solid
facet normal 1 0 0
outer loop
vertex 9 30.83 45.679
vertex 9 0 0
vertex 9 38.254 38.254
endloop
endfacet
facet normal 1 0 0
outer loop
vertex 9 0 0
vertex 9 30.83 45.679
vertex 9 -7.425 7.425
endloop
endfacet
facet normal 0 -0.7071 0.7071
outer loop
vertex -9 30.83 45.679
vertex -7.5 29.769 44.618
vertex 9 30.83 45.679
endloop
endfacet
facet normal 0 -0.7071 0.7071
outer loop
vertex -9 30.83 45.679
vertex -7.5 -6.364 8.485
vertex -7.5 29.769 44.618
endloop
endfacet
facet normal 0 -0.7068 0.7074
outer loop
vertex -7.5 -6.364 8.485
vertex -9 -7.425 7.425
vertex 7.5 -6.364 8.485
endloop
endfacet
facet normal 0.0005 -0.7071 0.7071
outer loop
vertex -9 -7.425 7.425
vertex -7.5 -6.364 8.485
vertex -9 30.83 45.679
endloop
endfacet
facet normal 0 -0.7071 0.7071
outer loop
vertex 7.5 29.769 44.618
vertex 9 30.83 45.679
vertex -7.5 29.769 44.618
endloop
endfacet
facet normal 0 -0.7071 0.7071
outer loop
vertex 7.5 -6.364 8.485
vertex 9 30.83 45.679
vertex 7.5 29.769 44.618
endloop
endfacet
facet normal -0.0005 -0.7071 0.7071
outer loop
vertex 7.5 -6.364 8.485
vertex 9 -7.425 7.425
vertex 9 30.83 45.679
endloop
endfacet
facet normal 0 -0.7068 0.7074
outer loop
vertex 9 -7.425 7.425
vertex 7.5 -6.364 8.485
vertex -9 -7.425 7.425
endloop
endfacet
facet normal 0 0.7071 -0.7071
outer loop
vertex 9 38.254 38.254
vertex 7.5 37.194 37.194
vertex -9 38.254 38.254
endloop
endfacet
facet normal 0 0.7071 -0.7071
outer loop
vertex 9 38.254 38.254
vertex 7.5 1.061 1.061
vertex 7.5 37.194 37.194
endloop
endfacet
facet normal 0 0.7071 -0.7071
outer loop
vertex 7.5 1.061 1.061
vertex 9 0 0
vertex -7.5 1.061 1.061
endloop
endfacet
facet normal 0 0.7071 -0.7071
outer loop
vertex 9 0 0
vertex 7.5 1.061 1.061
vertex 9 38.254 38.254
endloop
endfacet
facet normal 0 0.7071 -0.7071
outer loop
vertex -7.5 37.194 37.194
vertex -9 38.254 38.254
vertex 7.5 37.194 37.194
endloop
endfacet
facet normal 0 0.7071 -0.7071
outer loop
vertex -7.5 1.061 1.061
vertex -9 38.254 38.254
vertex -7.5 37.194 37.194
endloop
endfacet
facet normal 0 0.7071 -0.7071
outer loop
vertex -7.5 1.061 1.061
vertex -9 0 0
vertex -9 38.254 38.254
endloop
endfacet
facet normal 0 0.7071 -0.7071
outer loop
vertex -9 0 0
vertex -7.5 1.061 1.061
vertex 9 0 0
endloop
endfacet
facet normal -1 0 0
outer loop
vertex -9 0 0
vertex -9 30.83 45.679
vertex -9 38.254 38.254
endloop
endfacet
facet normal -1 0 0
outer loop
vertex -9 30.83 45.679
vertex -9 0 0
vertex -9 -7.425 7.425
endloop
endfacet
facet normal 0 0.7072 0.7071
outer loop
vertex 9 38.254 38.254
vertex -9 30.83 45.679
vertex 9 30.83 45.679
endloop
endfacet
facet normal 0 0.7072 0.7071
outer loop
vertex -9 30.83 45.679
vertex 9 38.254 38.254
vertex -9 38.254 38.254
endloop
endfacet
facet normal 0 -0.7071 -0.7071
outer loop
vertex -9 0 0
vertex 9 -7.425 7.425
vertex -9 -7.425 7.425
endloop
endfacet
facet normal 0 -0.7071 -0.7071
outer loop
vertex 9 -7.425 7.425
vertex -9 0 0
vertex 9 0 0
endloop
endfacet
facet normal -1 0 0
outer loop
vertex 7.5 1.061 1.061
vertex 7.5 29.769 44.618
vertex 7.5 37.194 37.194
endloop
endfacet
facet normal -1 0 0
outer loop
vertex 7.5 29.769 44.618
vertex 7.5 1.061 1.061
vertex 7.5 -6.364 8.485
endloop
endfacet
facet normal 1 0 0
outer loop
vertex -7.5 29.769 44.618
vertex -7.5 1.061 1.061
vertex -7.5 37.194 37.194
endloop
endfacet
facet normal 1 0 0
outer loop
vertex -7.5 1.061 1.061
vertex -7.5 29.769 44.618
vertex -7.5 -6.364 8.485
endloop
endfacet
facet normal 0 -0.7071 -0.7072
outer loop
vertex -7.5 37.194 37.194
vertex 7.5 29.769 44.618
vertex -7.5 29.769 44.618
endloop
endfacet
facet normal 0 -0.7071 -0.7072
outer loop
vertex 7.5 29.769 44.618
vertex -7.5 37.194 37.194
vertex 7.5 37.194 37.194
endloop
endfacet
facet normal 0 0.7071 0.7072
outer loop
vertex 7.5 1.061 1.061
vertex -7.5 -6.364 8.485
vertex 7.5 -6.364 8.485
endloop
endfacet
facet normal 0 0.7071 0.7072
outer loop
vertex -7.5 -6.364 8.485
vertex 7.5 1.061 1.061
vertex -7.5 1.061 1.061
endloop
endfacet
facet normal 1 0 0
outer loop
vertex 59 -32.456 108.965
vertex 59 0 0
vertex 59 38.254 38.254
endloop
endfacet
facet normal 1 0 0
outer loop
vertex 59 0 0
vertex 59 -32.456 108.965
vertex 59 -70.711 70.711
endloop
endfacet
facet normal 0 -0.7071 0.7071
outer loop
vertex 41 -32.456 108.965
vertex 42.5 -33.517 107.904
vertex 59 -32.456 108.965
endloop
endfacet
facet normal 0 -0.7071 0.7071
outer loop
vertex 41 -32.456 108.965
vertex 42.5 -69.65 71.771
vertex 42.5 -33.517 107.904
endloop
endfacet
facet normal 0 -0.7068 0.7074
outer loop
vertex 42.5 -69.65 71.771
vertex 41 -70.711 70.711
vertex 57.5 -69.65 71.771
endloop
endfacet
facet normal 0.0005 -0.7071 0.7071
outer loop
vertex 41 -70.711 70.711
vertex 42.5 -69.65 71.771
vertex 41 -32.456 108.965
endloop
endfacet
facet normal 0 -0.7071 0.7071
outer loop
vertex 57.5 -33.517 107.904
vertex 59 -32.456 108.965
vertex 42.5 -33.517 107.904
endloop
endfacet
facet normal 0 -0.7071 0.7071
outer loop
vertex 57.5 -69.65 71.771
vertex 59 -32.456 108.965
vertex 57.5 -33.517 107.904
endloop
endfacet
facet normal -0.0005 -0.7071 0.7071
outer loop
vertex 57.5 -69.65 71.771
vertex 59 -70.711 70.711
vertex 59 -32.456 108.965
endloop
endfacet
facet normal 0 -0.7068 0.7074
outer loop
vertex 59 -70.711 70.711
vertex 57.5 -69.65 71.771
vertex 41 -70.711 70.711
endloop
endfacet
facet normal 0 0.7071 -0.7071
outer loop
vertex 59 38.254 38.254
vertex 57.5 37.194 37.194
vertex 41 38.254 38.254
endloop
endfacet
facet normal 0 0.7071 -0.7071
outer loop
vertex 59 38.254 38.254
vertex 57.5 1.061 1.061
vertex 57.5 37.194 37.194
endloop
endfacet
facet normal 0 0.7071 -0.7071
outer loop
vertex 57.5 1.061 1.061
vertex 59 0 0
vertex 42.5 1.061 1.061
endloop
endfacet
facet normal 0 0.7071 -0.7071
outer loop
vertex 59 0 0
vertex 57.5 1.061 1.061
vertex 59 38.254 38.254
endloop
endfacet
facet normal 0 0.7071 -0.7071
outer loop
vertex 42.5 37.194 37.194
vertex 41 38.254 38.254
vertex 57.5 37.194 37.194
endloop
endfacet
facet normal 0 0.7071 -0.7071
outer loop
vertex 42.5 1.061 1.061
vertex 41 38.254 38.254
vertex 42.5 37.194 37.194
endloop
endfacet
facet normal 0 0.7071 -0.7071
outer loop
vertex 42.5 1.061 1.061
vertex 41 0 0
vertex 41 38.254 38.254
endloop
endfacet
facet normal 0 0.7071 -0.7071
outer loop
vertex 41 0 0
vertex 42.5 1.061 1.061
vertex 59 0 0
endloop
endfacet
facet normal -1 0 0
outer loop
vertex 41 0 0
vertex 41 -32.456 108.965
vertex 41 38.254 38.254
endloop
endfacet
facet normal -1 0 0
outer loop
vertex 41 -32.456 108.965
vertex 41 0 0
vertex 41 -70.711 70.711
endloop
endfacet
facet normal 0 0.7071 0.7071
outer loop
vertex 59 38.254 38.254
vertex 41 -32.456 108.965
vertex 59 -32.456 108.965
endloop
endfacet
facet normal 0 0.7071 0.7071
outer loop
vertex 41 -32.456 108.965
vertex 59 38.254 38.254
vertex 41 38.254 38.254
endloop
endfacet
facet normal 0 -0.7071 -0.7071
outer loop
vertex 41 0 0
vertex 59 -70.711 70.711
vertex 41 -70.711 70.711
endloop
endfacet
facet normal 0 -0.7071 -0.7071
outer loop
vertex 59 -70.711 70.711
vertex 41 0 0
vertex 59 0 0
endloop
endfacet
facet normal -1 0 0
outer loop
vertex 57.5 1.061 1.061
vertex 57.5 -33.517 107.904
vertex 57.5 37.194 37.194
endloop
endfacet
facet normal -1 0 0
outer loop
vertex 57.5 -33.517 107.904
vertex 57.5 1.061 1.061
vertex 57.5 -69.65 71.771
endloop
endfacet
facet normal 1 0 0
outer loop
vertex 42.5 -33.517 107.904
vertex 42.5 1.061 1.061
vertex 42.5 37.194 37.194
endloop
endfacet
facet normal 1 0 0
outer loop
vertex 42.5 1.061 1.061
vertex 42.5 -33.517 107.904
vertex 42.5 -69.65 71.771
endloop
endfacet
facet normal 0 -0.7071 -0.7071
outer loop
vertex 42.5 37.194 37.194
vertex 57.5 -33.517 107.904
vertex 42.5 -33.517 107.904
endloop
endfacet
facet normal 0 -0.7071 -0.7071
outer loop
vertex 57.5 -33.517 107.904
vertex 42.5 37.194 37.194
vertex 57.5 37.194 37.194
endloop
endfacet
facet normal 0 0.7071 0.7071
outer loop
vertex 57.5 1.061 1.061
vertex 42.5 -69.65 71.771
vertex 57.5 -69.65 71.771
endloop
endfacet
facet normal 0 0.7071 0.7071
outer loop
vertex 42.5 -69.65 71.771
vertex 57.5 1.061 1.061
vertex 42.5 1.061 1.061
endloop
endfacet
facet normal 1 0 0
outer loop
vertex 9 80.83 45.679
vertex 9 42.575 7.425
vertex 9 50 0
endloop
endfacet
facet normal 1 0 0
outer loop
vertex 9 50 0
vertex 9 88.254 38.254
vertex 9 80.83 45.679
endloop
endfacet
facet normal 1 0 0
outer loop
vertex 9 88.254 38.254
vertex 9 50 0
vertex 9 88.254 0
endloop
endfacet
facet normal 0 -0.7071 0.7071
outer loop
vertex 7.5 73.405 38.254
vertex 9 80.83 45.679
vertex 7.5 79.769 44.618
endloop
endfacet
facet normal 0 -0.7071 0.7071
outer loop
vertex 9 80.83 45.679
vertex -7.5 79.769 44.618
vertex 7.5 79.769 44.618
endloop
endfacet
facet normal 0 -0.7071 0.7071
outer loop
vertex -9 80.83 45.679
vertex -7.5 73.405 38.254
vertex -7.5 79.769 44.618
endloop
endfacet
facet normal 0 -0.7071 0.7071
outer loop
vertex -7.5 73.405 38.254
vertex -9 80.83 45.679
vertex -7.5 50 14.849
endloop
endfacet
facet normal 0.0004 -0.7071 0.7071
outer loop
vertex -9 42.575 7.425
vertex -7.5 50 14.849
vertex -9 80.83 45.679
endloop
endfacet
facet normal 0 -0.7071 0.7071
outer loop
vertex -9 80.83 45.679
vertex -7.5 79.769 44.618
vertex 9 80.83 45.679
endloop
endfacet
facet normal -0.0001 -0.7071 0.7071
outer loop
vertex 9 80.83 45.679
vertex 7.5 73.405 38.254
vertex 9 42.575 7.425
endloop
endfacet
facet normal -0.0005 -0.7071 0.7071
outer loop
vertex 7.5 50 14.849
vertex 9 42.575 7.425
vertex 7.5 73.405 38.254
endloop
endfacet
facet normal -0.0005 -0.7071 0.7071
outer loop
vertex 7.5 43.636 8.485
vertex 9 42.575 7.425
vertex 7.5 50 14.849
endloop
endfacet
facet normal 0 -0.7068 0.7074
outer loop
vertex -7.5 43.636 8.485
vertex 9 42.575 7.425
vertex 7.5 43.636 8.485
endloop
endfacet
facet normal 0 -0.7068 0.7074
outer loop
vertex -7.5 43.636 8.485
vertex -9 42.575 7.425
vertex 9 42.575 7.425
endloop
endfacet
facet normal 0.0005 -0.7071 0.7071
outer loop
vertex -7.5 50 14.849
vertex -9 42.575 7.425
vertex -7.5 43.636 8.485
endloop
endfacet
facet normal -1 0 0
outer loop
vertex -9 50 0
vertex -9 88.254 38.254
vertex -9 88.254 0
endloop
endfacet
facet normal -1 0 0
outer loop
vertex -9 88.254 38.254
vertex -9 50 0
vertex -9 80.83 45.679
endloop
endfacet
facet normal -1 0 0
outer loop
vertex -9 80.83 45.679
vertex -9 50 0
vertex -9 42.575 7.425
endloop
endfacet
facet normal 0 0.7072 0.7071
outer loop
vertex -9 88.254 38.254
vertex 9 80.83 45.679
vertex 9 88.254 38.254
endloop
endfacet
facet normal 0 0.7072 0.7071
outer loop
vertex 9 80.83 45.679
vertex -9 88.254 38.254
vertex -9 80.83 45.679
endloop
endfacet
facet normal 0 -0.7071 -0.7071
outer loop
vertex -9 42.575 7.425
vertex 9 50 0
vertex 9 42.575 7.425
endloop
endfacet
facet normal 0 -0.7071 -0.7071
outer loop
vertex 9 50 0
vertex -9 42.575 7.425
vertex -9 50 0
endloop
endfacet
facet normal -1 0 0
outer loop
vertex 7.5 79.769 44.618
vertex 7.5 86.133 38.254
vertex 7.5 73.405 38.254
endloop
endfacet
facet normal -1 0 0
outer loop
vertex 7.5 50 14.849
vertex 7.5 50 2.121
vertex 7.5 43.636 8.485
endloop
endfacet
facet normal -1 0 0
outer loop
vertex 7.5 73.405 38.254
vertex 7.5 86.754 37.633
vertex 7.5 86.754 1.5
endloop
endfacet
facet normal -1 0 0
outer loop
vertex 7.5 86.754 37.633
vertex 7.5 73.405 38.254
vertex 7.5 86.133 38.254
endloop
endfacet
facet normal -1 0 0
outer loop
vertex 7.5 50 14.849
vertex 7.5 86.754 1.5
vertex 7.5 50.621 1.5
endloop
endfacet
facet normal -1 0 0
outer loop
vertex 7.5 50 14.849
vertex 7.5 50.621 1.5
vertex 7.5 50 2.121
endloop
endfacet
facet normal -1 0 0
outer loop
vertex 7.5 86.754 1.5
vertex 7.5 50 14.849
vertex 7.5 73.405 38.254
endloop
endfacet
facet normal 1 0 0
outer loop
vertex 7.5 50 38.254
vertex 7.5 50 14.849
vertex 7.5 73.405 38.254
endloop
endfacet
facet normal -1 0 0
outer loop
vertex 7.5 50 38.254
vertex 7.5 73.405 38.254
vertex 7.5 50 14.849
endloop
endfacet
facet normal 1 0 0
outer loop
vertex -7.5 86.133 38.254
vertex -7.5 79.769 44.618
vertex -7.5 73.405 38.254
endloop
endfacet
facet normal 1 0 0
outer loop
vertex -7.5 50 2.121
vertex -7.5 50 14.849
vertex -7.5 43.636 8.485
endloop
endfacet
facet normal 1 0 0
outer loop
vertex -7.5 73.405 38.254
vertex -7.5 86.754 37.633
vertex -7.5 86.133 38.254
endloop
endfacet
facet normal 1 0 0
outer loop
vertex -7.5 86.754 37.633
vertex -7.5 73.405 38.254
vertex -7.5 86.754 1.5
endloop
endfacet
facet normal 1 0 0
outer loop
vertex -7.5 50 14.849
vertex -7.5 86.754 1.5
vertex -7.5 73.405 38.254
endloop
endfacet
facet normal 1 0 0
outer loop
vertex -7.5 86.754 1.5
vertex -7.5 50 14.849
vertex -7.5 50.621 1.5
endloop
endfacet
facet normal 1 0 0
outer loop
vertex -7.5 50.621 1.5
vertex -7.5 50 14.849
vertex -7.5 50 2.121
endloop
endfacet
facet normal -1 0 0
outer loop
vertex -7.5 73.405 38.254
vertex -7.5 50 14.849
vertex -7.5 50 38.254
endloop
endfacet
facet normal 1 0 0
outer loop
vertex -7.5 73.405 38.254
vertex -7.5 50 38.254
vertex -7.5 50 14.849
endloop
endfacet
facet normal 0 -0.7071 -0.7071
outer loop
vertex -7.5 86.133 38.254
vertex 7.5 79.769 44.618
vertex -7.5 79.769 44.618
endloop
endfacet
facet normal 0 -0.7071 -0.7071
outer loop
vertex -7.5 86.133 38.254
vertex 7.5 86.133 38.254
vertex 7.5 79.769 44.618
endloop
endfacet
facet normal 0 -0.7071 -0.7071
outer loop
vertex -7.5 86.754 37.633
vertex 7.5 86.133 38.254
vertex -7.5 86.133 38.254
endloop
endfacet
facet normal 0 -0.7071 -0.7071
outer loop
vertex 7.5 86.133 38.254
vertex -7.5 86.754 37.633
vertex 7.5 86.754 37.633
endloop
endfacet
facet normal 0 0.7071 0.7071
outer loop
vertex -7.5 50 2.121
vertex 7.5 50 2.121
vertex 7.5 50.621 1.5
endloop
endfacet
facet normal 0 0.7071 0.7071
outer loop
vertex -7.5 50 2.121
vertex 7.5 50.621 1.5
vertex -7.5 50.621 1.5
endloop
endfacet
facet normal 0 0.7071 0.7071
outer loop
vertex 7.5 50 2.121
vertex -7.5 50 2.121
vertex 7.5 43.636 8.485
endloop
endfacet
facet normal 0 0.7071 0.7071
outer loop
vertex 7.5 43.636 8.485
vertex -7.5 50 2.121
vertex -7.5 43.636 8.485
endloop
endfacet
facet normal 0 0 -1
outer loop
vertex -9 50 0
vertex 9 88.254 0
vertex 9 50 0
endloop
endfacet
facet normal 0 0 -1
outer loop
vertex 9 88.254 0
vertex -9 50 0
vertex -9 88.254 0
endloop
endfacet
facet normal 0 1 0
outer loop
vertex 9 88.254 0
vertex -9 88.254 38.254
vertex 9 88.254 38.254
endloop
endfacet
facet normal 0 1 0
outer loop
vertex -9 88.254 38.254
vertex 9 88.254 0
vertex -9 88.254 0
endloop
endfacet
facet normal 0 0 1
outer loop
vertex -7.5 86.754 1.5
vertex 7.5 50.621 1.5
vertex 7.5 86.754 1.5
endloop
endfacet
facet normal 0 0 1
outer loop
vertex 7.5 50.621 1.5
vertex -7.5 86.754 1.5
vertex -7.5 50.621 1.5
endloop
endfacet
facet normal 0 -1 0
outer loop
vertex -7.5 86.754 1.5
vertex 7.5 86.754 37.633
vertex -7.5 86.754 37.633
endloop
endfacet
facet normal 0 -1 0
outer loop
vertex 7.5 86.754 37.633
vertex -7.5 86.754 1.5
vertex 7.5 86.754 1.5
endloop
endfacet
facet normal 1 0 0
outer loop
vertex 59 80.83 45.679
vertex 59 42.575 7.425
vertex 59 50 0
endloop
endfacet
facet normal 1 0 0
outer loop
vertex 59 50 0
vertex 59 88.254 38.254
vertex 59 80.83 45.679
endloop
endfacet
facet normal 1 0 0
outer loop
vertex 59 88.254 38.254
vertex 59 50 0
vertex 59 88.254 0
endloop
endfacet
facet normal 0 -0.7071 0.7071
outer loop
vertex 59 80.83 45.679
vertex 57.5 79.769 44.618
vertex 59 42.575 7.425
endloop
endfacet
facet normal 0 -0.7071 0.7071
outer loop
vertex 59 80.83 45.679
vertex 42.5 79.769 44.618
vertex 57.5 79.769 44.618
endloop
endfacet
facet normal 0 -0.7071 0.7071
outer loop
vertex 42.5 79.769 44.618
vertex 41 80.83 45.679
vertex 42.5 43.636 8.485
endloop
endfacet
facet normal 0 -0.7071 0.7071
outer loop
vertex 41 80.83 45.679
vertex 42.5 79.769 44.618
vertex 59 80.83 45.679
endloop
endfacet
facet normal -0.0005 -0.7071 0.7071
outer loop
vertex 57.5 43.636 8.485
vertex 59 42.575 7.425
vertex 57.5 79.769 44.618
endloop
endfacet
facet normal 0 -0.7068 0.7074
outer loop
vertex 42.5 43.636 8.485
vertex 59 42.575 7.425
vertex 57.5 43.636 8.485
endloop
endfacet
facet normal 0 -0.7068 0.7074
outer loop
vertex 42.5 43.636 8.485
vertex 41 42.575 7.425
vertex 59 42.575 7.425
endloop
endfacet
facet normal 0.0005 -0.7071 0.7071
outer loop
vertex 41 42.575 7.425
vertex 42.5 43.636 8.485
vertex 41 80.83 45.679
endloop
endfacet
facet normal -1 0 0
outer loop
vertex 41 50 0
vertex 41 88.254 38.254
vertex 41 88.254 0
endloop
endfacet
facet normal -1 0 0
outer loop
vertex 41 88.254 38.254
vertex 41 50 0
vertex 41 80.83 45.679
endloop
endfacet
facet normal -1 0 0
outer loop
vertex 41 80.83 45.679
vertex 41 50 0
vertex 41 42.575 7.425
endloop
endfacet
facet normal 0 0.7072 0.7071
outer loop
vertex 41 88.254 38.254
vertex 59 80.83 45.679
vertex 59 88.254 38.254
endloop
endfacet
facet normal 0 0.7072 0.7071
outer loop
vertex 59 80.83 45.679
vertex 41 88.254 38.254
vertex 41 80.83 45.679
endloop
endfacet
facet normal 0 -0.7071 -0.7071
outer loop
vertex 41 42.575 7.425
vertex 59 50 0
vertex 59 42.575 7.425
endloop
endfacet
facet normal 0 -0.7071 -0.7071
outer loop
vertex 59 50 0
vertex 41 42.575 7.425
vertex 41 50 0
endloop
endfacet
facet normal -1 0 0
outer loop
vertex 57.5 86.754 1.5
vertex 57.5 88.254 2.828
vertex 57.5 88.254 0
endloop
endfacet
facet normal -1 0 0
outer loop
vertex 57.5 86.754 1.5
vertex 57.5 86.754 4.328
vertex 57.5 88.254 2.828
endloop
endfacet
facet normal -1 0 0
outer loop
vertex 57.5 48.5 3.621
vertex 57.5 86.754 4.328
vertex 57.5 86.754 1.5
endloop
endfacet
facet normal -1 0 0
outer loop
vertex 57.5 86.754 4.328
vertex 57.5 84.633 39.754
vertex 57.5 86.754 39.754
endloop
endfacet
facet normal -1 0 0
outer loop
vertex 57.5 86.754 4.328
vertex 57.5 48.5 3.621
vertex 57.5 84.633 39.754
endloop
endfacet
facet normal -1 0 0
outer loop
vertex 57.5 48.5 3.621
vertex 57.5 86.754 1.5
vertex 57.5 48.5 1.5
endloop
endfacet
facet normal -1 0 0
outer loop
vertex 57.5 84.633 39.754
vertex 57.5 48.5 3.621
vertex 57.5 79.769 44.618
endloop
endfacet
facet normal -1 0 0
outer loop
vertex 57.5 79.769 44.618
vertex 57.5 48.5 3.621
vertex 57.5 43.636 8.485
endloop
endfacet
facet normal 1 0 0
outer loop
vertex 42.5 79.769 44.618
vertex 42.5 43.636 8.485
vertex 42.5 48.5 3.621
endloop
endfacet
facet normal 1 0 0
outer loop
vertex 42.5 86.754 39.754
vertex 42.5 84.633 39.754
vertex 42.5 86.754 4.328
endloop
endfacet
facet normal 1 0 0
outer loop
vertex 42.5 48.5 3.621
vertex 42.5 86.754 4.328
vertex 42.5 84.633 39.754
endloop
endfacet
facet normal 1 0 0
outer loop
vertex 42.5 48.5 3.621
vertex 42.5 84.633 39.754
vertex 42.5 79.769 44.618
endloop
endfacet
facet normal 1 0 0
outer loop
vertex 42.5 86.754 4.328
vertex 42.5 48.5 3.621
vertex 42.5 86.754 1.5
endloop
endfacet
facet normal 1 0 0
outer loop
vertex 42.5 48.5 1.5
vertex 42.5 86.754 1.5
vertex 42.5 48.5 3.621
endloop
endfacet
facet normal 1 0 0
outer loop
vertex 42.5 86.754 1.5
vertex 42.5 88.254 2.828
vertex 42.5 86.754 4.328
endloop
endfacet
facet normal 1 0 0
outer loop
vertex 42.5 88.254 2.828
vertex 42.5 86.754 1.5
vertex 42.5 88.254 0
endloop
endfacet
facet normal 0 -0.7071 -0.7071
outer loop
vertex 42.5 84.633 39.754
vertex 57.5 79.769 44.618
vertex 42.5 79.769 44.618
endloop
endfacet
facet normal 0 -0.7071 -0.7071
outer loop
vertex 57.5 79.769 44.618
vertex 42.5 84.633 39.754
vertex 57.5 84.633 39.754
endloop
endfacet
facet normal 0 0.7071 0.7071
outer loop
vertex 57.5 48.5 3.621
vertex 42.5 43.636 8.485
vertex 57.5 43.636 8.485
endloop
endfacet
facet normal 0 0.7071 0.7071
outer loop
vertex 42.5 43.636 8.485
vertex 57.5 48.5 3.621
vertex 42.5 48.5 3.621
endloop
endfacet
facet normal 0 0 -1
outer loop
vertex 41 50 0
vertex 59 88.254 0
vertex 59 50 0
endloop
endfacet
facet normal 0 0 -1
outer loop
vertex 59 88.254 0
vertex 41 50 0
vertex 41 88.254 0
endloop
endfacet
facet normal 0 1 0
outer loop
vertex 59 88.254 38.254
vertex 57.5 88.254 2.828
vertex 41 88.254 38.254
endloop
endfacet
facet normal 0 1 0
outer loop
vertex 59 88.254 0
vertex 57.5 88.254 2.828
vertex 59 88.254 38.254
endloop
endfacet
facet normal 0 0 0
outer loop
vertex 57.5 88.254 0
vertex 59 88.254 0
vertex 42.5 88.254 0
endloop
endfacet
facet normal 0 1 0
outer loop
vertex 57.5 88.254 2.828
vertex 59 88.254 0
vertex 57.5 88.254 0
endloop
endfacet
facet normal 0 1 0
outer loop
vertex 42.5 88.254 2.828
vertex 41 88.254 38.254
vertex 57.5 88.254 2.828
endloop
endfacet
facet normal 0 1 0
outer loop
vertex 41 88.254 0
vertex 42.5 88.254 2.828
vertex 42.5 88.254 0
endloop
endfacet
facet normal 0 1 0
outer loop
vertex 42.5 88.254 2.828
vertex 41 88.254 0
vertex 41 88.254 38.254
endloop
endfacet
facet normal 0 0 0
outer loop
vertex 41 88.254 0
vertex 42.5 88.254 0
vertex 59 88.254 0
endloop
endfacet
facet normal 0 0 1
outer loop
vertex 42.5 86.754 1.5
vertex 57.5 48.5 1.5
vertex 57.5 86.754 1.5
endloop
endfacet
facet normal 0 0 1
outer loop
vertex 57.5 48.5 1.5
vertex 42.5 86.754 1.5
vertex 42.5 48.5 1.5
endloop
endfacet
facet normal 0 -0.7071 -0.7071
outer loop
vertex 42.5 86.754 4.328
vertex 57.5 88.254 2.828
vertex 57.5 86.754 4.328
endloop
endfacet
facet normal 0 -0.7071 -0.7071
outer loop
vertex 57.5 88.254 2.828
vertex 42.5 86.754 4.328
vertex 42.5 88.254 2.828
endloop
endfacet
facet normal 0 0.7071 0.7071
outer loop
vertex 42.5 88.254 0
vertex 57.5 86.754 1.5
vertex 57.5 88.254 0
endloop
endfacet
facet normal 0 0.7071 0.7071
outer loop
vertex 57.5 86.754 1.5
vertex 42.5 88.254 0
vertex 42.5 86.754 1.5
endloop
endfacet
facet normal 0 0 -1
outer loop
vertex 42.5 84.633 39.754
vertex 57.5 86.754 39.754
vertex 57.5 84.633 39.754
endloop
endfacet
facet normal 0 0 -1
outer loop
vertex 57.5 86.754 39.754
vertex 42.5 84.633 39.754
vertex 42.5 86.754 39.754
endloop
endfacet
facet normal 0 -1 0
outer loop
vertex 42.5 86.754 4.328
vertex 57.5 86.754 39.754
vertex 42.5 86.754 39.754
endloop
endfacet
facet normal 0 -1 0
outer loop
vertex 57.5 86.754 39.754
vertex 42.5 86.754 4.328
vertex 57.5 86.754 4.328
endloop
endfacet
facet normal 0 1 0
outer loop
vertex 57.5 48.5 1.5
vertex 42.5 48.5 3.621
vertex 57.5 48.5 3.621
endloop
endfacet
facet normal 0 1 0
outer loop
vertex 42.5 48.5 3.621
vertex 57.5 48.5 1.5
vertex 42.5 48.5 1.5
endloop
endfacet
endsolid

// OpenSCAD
w=15;
l=51.1;
d=10.5;
th=1.5;
tilt=45;
long_l = l+2*th;
long_w = w+2*th;
module fan_shroud(depth) {
    rotate([90-tilt,0,0])
    translate([0,l/2+th,depth/2])
    difference() {
        cube([w+2*th,l+2*th,depth],center=true);
        cube([w,l,depth+2],center=true);
    }
}
fan_shroud(d);
translate([50,0,0]) fan_shroud(100);
module fan_mount() {
    difference() {
        union(){
            translate([-w/2-th,0,0])
            cube([th,cos(90-tilt)*long_l,sin(90-tilt)*long_l]);   
            translate([+w/2,0,0])
            cube([th,cos(90-tilt)*long_l,sin(90-tilt)*long_l]);       
        } 
        fan_shroud(100);

    }
    fan_shroud(d);
    translate([-w/2-th,0,0])
    cube([w+2*th,cos(90-tilt)*long_l,th]);
    translate([-w/2-th,cos(90-tilt)*long_l-th,0])
    cube([w+2*th,th,sin(90-tilt)*long_l]);
}
translate([0,50,0]) fan_mount();

module fan_mount2() {
    difference() {
        translate([0,-cos(90-tilt)*long_l,0])
        fan_mount();
        fan_subtract();
    }
}
color("green") translate([50,+50+cos(90-tilt)*long_l,0]) fan_mount2();

module fan_subtract() {
    rotate([90-tilt,0,0])
    translate([-w/2,0,-25])
    cube([w,2,50]);
    translate([-w/2,-th-sin(90-tilt)*long_l,th])
        cube([w,sin(90-tilt)*long_l,cos(90-tilt)*long_l]);
}
%translate([0,50+cos(90-tilt)*long_l,0]) fan_subtract();

//fan_mount2();
//color("blue")
//fan_subtract();
